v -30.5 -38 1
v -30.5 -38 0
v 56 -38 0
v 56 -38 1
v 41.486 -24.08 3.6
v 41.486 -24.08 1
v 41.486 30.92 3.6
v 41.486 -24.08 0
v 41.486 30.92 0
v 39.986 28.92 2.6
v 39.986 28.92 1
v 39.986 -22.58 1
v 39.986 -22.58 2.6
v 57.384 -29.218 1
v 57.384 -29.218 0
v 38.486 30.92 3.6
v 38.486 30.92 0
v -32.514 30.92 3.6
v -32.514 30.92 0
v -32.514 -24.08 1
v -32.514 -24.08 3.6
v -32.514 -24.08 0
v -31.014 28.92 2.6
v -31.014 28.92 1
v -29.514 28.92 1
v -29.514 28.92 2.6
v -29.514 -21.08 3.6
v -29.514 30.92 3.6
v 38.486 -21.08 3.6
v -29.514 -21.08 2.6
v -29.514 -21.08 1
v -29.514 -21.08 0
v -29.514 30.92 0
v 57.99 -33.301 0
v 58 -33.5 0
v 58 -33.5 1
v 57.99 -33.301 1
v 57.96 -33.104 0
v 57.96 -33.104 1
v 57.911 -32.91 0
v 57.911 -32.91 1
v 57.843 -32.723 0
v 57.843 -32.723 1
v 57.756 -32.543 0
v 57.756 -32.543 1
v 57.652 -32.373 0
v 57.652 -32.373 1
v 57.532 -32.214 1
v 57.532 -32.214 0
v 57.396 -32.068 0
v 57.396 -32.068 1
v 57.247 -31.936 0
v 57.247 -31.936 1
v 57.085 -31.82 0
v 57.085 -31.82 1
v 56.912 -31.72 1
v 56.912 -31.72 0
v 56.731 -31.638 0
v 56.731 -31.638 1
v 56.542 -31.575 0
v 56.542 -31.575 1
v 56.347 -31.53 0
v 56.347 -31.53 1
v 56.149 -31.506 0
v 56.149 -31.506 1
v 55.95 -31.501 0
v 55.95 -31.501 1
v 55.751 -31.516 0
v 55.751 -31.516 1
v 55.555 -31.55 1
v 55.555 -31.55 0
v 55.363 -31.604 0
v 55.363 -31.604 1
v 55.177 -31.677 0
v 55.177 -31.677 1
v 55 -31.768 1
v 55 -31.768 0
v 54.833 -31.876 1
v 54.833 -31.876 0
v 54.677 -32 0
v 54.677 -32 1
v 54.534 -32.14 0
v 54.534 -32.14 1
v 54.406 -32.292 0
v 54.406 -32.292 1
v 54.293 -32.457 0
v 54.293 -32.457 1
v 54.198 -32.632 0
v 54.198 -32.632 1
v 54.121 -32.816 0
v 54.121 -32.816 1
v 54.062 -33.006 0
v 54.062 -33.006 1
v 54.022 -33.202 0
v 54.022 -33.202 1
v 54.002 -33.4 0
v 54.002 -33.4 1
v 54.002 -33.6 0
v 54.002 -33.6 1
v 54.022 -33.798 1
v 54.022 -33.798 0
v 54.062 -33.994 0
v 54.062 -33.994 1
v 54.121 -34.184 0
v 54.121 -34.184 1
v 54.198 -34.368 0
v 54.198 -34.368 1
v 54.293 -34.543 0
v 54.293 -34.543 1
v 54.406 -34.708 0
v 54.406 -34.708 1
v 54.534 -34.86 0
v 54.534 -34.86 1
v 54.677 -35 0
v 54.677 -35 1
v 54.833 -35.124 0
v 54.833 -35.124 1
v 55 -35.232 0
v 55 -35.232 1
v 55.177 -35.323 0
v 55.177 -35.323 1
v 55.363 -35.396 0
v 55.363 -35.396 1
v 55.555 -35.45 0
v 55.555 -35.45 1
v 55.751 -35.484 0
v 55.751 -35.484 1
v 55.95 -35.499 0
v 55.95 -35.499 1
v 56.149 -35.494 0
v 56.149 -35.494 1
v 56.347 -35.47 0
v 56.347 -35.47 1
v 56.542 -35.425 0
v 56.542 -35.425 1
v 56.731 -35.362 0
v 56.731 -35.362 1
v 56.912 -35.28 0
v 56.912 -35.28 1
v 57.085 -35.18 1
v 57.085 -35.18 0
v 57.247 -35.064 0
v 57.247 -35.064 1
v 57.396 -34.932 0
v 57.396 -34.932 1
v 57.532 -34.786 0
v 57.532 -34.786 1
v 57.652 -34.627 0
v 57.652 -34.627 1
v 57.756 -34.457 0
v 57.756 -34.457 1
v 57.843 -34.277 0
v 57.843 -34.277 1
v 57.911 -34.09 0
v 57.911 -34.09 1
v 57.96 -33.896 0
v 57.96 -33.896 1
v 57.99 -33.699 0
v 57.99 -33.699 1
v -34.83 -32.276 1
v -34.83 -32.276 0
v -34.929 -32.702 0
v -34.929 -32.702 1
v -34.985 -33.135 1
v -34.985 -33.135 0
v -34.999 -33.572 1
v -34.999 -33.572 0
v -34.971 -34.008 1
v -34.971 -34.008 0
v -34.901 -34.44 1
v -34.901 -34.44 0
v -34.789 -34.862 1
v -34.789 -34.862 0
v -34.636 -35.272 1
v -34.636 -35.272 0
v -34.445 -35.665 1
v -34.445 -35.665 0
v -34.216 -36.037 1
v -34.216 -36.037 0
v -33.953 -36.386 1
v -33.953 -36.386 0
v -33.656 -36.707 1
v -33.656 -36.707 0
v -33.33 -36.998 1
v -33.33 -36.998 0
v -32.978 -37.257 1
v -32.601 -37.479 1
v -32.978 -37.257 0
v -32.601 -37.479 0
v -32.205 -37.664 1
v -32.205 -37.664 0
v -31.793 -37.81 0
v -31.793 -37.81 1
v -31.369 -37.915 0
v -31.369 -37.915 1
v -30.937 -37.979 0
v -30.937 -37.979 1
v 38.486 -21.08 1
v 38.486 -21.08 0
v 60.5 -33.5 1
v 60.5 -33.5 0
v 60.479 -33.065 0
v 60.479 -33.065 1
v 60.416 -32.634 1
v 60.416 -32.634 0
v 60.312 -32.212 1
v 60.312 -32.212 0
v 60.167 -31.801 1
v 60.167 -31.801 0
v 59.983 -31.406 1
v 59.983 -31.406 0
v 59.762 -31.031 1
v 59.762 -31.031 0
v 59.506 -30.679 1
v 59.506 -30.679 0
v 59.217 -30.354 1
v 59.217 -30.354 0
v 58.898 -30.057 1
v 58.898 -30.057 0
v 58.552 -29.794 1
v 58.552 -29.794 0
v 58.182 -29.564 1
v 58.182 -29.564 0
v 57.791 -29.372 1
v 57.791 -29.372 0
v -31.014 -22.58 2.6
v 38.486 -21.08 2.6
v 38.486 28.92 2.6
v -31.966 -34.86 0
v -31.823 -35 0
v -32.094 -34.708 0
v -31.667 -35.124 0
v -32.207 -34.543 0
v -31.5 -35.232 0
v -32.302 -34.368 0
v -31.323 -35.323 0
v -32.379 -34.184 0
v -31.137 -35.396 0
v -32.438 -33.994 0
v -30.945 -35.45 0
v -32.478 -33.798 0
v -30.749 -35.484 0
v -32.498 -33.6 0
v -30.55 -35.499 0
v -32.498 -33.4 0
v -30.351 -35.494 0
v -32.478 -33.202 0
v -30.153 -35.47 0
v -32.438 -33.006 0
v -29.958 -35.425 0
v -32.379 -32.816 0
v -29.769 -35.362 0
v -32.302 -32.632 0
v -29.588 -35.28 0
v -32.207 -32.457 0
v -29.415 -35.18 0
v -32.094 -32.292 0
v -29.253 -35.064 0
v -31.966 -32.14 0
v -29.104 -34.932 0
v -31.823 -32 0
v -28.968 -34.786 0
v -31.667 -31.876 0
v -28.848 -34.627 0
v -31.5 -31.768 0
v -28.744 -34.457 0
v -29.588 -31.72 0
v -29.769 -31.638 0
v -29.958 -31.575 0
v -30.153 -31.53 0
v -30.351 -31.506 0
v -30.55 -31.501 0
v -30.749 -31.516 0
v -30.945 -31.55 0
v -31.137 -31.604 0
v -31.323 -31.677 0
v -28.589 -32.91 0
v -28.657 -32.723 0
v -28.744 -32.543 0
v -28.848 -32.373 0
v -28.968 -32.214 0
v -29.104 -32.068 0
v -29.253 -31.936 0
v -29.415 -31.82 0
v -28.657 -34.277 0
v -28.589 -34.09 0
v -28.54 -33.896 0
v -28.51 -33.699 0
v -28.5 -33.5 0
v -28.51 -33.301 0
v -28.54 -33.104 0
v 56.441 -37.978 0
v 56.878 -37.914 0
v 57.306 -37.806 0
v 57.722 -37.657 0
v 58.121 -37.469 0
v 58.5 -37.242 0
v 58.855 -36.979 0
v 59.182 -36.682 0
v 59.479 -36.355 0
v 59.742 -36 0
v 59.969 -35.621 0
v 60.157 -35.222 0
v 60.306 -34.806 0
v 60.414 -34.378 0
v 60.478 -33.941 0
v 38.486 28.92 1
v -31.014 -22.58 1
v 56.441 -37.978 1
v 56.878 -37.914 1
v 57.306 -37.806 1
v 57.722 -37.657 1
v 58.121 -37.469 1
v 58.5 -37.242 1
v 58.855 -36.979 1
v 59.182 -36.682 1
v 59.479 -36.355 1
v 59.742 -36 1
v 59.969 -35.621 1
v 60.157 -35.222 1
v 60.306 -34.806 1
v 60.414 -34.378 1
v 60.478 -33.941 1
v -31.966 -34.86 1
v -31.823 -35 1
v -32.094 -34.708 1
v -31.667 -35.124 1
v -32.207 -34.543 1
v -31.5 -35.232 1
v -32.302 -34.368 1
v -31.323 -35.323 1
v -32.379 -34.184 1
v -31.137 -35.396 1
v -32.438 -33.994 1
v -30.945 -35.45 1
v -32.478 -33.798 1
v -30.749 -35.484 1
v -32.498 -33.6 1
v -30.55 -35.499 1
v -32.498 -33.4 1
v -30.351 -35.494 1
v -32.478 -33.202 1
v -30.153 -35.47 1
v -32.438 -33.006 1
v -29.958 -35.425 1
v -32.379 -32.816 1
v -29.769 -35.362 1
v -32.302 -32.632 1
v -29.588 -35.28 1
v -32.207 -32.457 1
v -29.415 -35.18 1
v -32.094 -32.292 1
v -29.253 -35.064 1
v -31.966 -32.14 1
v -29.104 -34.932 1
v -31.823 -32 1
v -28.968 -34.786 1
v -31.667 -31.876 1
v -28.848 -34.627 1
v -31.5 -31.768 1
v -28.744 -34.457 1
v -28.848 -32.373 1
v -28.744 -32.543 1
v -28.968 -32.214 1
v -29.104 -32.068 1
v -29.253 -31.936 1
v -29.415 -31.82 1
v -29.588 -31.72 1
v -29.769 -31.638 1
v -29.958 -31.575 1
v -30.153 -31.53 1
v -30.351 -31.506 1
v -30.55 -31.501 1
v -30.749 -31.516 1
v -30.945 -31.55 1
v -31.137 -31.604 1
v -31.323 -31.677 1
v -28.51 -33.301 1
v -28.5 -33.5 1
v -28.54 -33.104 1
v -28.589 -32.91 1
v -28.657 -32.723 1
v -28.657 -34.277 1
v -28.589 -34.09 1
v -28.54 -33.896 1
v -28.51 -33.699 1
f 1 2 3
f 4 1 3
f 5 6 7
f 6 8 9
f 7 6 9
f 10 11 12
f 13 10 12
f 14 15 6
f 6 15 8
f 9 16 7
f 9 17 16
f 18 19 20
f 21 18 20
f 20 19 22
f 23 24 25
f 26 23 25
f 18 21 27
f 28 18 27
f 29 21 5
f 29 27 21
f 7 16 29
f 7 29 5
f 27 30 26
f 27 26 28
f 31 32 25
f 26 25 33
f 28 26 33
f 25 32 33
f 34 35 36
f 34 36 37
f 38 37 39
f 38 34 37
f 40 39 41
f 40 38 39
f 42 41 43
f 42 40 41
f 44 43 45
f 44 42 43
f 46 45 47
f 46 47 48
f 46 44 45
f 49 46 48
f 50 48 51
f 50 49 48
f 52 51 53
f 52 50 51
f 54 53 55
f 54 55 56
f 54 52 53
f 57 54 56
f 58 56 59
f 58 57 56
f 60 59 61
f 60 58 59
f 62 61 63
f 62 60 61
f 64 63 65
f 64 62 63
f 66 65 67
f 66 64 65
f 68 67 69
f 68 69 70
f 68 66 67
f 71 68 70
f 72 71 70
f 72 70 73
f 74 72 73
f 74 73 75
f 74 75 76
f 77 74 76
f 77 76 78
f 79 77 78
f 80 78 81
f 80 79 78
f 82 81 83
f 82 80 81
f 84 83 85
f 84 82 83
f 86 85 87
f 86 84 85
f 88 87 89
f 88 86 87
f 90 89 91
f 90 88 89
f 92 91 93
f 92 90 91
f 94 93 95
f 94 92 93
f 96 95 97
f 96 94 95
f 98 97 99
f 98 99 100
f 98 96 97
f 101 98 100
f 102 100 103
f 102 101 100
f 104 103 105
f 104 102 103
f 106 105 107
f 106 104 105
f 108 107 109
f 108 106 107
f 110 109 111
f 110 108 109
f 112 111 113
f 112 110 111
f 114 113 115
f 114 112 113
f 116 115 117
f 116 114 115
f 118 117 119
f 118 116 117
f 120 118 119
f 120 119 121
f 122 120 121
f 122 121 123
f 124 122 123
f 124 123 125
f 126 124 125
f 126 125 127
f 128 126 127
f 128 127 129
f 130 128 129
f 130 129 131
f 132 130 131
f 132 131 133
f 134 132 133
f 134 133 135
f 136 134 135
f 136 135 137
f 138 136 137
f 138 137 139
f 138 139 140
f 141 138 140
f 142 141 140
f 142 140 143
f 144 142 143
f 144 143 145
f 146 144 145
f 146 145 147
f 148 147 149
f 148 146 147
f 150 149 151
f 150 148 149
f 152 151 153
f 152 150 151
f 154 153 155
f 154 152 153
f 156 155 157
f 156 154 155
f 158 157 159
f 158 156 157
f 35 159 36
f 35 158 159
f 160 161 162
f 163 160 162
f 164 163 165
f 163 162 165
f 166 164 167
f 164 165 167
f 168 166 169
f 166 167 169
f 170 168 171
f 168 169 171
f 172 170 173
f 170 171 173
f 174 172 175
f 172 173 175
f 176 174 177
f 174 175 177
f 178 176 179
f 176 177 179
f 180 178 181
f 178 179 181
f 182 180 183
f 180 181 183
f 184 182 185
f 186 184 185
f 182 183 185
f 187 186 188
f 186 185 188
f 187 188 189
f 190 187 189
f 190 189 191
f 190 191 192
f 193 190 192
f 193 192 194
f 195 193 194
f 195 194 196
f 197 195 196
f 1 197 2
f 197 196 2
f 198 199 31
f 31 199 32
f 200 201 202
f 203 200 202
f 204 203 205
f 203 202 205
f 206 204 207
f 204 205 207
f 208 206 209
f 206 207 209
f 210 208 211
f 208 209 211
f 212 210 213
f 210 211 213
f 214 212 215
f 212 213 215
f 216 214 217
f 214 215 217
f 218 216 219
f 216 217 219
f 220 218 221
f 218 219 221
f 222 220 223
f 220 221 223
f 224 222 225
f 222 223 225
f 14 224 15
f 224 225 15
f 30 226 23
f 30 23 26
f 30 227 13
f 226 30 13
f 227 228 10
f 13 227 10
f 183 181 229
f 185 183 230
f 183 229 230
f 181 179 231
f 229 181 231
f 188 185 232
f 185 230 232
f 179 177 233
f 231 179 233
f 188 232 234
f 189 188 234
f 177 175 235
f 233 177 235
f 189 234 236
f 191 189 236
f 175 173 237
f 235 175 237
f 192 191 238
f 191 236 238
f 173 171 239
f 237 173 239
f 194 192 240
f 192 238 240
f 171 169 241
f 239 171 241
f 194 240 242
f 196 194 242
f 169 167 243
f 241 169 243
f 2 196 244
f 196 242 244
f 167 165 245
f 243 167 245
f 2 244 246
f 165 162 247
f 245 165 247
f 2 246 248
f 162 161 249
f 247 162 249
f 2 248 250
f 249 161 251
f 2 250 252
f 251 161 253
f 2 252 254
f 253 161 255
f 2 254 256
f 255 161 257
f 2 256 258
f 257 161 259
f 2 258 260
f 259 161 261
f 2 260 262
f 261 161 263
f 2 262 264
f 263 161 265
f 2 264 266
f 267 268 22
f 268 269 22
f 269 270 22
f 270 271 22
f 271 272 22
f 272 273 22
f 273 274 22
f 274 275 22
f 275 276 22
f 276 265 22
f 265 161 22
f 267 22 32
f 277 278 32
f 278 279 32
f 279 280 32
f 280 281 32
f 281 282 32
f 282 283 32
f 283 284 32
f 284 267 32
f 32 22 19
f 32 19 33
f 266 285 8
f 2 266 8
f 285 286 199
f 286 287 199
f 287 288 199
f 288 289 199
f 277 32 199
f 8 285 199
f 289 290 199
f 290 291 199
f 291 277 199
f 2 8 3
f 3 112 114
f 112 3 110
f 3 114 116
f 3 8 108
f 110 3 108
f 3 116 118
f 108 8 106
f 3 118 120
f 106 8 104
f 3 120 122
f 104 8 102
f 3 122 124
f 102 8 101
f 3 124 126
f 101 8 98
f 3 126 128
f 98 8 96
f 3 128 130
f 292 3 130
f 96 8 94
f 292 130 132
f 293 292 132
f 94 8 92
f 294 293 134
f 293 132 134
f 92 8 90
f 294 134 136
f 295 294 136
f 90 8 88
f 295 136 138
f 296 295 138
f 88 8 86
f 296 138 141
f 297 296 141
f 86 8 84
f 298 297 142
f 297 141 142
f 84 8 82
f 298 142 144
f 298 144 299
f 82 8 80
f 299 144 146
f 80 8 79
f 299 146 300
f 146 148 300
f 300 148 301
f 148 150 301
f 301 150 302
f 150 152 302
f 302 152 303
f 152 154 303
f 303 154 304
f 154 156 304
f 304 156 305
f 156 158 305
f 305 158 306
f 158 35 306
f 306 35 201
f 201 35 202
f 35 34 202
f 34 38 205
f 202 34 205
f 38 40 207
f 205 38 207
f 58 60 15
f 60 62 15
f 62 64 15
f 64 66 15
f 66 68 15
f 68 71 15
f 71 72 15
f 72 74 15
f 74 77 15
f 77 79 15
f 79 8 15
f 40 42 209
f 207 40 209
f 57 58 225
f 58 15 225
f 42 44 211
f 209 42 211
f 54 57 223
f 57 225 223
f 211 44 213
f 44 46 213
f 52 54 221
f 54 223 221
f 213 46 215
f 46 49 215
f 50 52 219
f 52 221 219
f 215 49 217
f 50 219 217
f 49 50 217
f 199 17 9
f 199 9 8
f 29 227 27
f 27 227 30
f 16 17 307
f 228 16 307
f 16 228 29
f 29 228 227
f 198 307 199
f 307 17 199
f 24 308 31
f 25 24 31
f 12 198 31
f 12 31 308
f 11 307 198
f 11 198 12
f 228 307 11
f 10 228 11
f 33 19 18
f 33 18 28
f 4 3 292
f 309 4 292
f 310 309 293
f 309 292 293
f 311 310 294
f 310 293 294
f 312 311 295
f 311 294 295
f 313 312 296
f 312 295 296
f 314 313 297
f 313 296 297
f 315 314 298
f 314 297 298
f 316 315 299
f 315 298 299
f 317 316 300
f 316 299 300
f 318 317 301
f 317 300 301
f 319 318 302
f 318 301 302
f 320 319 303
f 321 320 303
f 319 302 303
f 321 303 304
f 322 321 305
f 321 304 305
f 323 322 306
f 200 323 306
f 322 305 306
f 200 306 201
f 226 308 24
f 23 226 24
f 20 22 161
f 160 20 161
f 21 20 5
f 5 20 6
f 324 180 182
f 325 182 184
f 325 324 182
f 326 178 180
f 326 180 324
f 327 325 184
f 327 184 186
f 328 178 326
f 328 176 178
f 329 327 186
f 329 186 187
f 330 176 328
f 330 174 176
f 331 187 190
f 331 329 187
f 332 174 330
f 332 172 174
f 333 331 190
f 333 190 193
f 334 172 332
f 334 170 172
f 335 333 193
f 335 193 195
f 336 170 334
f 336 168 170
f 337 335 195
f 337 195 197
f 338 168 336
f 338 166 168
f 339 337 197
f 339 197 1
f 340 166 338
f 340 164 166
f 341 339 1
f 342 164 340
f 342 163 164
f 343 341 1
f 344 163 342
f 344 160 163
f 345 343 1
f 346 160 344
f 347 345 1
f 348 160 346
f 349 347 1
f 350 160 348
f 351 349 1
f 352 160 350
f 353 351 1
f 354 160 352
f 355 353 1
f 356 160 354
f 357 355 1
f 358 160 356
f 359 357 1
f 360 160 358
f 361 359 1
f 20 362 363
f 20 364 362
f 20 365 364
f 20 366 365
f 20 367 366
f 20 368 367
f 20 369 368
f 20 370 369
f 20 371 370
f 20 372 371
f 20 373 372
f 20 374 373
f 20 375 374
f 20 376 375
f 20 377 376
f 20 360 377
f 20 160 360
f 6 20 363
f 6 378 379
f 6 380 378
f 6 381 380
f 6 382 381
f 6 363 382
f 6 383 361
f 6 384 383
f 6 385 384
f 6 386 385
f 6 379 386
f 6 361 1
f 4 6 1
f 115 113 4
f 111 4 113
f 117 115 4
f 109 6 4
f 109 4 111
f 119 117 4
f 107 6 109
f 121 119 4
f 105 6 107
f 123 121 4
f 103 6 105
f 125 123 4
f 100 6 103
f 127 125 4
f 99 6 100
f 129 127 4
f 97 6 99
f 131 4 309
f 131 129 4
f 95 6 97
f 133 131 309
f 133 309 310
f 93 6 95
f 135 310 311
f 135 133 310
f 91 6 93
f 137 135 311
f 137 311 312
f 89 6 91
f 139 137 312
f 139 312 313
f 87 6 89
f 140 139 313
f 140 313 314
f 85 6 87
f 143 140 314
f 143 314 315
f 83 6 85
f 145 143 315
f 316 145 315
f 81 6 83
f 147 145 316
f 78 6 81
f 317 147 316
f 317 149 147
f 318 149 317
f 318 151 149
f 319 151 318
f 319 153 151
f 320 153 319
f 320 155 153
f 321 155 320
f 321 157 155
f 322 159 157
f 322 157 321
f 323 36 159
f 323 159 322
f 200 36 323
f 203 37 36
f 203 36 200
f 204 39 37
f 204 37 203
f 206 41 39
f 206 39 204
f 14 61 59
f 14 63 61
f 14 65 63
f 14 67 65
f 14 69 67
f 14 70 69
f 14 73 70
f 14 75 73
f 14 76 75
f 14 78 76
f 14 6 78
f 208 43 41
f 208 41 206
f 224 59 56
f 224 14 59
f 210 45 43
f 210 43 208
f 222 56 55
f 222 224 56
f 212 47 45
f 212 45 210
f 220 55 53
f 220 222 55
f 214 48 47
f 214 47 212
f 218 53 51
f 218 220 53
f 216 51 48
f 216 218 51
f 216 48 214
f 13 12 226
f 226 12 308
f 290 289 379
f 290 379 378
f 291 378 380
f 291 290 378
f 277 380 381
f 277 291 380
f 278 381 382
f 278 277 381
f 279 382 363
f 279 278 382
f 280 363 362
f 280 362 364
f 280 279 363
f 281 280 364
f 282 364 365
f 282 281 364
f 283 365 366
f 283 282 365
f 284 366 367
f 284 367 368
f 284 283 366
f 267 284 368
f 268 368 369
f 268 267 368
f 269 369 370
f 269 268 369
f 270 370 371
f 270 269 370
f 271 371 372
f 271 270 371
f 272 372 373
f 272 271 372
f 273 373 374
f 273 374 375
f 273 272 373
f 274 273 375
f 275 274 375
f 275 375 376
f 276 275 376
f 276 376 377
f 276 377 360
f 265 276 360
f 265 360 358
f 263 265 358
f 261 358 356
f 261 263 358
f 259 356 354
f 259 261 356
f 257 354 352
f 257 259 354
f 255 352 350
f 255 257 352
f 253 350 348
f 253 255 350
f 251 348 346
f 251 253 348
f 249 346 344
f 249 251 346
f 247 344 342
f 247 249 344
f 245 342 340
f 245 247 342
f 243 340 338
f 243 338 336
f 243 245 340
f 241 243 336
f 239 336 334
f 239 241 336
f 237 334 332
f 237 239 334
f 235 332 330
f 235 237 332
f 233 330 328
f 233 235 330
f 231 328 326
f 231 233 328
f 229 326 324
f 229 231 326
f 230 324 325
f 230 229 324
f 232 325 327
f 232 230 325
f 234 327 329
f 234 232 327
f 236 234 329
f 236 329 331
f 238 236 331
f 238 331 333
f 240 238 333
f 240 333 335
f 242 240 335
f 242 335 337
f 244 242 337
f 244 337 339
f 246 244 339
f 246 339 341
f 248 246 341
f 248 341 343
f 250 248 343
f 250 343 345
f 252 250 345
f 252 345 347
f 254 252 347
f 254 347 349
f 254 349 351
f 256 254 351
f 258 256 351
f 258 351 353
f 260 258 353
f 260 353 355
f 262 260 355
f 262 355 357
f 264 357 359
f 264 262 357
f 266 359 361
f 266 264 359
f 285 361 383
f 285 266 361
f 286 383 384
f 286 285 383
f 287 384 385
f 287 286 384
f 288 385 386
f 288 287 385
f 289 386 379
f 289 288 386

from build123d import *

# Parameters (mm, degrees)
F1_R     = 2
F1_W     = 3
F1_H     = 3
F6_DEPTH = 1
F7_DEPTH = 1.6
F5_W     = 3
F5_H     = 3
F8_DEPTH = 1


with BuildPart() as f6:
    # F1 (on Top) → F6 (new body, through all)
    with BuildSketch(Plane.XY):
        with BuildLine():
            ThreePointArc((-30.5, -38), (-27.318019, -36.681981), (-26, -33.5))
            ThreePointArc((-26, -33.5), (-29.882129, -29.04262), (-34.830327, -32.275961))
            ThreePointArc((-34.830327, -32.275961), (-34.088744, -36.214943), (-30.5, -38))
        make_face()
        with Locations((-30.5, -33.5)):
            Circle(F1_R, mode=Mode.SUBTRACT)
        with BuildLine():
            ThreePointArc((-34.830327, -32.275961), (-29.882129, -29.04262), (-26, -33.5))
            ThreePointArc((-26, -33.5), (-27.318019, -36.681981), (-30.5, -38))
            Line((-30.5, -38), (56, -38))
            ThreePointArc((56, -38), (51.55486, -32.79948), (57.383959, -29.218101))
            Line((57.383959, -29.218101), (41.486443, -24.079841))
            Line((41.486443, -24.079841), (-32.513557, -24.079841))
            Line((-32.513557, -24.079841), (-34.830327, -32.275961))
        make_face()
        Polygon((-32.513557, 27.920159), (-32.513557, -24.079841), (41.486443, -24.079841), (41.486443, 27.920159), (38.486443, 27.920159), (38.486443, -21.079841), (-29.513557, -21.079841), (-29.513557, 27.920159), align=None)
        with BuildLine():
            ThreePointArc((57.383959, -29.218101), (51.55486, -32.79948), (56, -38))
            ThreePointArc((56, -38), (59.181981, -36.681981), (60.5, -33.5))
            ThreePointArc((60.5, -33.5), (59.638531, -30.852153), (57.383959, -29.218101))
        make_face()
        with Locations((56, -33.5)):
            Circle(F1_R, mode=Mode.SUBTRACT)
        with Locations((-31.013557, 29.420159)):
            Rectangle(F1_W, F1_H)
        with Locations((39.986443, 29.420159)):
            Rectangle(F1_W, F1_H)
    extrude(amount=F6_DEPTH)

    # F3 (on offset) → F7 (join, through all)
    with BuildSketch(Plane.XY.offset(1)):
        Polygon((-31.013557, 27.920159), (-32.513557, 27.920159), (-32.513557, -24.079841), (41.486443, -24.079841), (41.486443, 27.920159), (39.986443, 27.920159), (39.986443, -22.579841), (-31.013557, -22.579841), align=None)
        Polygon((-32.513557, 30.920159), (-32.513557, 27.920159), (-31.013557, 27.920159), (-31.013557, 28.920159), (-29.513557, 28.920159), (-29.513557, 30.920159), align=None)
        Polygon((39.986443, 27.920159), (41.486443, 27.920159), (41.486443, 30.920159), (38.486443, 30.920159), (38.486443, 28.920159), (39.986443, 28.920159), align=None)
    extrude(amount=F7_DEPTH)

    # F5 (on offset) → F8 (join)
    with BuildSketch(Plane.XY.offset(2.6)):
        Polygon((-29.513557, 27.920159), (-32.513557, 27.920159), (-32.513557, -24.079841), (41.486443, -24.079841), (41.486443, 27.920159), (38.486443, 27.920159), (38.486443, -21.079841), (-29.513557, -21.079841), align=None)
        with Locations((-31.013557, 29.420159)):
            Rectangle(F5_W, F5_H)
        with Locations((39.986443, 29.420159)):
            Rectangle(F5_W, F5_H)
    extrude(amount=F8_DEPTH)


solid = f6.part
